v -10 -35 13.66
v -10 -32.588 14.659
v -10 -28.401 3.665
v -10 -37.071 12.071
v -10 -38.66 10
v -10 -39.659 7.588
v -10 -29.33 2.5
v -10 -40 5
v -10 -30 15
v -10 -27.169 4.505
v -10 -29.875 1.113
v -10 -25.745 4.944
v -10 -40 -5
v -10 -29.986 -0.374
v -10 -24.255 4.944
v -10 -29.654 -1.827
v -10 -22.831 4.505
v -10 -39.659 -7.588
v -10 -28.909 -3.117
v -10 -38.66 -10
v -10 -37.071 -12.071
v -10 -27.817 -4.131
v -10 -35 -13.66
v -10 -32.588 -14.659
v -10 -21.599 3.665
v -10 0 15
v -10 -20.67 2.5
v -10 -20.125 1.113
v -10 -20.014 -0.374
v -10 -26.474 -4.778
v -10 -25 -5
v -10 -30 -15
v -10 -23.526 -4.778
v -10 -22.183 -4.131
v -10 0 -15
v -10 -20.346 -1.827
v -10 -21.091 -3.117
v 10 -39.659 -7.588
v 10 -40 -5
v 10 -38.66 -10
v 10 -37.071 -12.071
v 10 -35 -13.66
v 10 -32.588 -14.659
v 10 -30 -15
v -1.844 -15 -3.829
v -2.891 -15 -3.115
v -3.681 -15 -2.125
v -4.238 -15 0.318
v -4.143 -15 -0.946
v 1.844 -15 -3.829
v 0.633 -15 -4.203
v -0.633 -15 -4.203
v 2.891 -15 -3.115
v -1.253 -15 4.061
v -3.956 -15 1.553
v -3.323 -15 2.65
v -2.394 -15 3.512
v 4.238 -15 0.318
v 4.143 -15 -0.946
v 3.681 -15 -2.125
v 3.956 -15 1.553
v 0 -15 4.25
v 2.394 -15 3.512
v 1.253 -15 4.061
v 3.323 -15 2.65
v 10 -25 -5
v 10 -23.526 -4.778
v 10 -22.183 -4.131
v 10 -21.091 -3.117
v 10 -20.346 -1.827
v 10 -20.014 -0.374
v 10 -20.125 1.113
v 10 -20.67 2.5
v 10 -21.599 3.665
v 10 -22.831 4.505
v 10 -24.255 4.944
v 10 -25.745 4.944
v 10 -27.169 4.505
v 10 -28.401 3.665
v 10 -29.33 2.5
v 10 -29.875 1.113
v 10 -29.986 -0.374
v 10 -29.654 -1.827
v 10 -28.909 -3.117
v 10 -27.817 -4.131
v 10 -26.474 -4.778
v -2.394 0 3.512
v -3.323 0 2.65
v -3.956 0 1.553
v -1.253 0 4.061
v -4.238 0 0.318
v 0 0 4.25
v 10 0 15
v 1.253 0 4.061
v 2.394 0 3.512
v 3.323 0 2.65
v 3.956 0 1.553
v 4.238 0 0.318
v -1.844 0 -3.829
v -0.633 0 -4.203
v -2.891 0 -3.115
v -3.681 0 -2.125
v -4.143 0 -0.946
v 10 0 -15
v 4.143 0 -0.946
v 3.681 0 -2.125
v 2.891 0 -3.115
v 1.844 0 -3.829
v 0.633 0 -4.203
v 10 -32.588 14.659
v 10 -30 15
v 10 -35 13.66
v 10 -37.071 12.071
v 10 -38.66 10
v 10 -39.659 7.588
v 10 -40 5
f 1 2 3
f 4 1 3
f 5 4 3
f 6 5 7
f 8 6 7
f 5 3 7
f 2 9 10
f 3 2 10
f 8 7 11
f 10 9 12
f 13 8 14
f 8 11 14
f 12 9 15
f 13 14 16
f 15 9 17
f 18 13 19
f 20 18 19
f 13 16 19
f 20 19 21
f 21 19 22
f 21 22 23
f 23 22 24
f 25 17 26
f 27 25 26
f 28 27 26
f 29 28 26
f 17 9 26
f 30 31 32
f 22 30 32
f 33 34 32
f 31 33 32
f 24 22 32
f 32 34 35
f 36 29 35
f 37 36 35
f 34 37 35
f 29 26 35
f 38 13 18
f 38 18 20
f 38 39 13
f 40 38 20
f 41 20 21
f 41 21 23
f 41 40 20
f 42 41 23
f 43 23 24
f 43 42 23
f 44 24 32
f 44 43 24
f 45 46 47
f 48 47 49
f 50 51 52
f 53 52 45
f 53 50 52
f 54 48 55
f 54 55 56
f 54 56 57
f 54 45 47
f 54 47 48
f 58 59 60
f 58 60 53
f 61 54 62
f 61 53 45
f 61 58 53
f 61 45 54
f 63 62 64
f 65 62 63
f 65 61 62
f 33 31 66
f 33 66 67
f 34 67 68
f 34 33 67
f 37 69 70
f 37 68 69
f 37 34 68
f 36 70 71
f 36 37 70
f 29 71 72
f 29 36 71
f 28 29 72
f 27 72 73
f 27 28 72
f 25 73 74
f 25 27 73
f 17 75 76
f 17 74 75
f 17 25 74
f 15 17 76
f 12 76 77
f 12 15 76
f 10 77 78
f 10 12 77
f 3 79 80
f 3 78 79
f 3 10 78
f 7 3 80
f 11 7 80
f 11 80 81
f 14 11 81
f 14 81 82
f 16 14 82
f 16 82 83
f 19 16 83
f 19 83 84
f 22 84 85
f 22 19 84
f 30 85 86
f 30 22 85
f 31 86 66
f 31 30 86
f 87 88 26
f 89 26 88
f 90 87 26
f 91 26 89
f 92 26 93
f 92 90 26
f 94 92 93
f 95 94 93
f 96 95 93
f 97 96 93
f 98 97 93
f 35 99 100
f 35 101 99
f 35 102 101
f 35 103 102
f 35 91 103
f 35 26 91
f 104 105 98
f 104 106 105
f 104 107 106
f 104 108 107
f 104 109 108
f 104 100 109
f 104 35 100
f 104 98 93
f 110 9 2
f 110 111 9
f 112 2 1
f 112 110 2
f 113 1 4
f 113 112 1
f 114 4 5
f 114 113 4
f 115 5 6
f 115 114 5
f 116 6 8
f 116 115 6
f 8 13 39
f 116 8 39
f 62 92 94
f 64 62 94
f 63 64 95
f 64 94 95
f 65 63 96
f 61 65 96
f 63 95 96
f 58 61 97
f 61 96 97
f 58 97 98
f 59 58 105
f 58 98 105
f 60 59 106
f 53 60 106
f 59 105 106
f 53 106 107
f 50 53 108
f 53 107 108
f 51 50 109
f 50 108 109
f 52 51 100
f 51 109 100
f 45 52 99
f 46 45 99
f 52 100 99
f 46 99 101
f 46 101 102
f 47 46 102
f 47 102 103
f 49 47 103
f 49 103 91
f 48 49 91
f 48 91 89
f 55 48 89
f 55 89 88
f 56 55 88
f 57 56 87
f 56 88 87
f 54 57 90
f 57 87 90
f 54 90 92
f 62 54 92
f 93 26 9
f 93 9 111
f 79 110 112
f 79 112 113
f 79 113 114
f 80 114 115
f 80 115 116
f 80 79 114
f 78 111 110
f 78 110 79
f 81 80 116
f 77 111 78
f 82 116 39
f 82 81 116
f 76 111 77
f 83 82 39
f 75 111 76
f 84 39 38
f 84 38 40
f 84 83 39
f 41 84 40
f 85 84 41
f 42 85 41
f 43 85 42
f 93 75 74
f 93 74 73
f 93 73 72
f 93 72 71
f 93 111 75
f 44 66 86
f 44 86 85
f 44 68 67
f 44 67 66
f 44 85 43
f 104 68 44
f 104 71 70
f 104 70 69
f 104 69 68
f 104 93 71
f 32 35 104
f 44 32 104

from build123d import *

# Parameters (mm, degrees)
SKETCH1_W               = 20
SKETCH1_H               = 30
BOSS_EXTRUDE1_DEPTH     = 40
SKETCH2_R               = 4.25
CUT_EXTRUDE1_DEPTH      = 15
CUT_EXTRUDE2_DEPTH      = 44.874821937
CUT_EXTRUDE2_DEPTH_BACK = 44.874821937
SKETCH11_R              = 5
FILLET1_R               = 10


with BuildPart() as part:
    # Sketch1 → Boss-Extrude1 (new body)
    with BuildSketch(Plane(origin=(0, 0, 0), x_dir=(1, 0, 0), z_dir=(0, 1, 0))):
        Rectangle(SKETCH1_W, SKETCH1_H)
    extrude(amount=-BOSS_EXTRUDE1_DEPTH)

    # Sketch2 → Cut-Extrude1 (cut)
    with BuildSketch(Plane(origin=(0, 0, 0), x_dir=(1, 0, 0), z_dir=(0, 1, 0))):
        with Locations(Location((0, 0, 0), (0, 0, 270))):
            Circle(SKETCH2_R)
    extrude(amount=-CUT_EXTRUDE1_DEPTH, mode=Mode.SUBTRACT)

    # Sketch11 → Cut-Extrude2 (cut, two sides: drawn at the far end of the back side and taken through both)
    with BuildSketch(Plane(origin=(0, 0, 0), x_dir=(0, 0, -1), z_dir=(1, 0, 0)).offset(-CUT_EXTRUDE2_DEPTH_BACK)):
        with Locations((0, -25)):
            Circle(SKETCH11_R)
    extrude(amount=CUT_EXTRUDE2_DEPTH + CUT_EXTRUDE2_DEPTH_BACK, mode=Mode.SUBTRACT)

    # Fillet1
    fillet1_edges = [part.edges().sort_by_distance(p)[0] for p in [
        (0, -40, 15),
        (0, -40, -15),
    ]]
    fillet(fillet1_edges, radius=FILLET1_R)


solid = part.part
